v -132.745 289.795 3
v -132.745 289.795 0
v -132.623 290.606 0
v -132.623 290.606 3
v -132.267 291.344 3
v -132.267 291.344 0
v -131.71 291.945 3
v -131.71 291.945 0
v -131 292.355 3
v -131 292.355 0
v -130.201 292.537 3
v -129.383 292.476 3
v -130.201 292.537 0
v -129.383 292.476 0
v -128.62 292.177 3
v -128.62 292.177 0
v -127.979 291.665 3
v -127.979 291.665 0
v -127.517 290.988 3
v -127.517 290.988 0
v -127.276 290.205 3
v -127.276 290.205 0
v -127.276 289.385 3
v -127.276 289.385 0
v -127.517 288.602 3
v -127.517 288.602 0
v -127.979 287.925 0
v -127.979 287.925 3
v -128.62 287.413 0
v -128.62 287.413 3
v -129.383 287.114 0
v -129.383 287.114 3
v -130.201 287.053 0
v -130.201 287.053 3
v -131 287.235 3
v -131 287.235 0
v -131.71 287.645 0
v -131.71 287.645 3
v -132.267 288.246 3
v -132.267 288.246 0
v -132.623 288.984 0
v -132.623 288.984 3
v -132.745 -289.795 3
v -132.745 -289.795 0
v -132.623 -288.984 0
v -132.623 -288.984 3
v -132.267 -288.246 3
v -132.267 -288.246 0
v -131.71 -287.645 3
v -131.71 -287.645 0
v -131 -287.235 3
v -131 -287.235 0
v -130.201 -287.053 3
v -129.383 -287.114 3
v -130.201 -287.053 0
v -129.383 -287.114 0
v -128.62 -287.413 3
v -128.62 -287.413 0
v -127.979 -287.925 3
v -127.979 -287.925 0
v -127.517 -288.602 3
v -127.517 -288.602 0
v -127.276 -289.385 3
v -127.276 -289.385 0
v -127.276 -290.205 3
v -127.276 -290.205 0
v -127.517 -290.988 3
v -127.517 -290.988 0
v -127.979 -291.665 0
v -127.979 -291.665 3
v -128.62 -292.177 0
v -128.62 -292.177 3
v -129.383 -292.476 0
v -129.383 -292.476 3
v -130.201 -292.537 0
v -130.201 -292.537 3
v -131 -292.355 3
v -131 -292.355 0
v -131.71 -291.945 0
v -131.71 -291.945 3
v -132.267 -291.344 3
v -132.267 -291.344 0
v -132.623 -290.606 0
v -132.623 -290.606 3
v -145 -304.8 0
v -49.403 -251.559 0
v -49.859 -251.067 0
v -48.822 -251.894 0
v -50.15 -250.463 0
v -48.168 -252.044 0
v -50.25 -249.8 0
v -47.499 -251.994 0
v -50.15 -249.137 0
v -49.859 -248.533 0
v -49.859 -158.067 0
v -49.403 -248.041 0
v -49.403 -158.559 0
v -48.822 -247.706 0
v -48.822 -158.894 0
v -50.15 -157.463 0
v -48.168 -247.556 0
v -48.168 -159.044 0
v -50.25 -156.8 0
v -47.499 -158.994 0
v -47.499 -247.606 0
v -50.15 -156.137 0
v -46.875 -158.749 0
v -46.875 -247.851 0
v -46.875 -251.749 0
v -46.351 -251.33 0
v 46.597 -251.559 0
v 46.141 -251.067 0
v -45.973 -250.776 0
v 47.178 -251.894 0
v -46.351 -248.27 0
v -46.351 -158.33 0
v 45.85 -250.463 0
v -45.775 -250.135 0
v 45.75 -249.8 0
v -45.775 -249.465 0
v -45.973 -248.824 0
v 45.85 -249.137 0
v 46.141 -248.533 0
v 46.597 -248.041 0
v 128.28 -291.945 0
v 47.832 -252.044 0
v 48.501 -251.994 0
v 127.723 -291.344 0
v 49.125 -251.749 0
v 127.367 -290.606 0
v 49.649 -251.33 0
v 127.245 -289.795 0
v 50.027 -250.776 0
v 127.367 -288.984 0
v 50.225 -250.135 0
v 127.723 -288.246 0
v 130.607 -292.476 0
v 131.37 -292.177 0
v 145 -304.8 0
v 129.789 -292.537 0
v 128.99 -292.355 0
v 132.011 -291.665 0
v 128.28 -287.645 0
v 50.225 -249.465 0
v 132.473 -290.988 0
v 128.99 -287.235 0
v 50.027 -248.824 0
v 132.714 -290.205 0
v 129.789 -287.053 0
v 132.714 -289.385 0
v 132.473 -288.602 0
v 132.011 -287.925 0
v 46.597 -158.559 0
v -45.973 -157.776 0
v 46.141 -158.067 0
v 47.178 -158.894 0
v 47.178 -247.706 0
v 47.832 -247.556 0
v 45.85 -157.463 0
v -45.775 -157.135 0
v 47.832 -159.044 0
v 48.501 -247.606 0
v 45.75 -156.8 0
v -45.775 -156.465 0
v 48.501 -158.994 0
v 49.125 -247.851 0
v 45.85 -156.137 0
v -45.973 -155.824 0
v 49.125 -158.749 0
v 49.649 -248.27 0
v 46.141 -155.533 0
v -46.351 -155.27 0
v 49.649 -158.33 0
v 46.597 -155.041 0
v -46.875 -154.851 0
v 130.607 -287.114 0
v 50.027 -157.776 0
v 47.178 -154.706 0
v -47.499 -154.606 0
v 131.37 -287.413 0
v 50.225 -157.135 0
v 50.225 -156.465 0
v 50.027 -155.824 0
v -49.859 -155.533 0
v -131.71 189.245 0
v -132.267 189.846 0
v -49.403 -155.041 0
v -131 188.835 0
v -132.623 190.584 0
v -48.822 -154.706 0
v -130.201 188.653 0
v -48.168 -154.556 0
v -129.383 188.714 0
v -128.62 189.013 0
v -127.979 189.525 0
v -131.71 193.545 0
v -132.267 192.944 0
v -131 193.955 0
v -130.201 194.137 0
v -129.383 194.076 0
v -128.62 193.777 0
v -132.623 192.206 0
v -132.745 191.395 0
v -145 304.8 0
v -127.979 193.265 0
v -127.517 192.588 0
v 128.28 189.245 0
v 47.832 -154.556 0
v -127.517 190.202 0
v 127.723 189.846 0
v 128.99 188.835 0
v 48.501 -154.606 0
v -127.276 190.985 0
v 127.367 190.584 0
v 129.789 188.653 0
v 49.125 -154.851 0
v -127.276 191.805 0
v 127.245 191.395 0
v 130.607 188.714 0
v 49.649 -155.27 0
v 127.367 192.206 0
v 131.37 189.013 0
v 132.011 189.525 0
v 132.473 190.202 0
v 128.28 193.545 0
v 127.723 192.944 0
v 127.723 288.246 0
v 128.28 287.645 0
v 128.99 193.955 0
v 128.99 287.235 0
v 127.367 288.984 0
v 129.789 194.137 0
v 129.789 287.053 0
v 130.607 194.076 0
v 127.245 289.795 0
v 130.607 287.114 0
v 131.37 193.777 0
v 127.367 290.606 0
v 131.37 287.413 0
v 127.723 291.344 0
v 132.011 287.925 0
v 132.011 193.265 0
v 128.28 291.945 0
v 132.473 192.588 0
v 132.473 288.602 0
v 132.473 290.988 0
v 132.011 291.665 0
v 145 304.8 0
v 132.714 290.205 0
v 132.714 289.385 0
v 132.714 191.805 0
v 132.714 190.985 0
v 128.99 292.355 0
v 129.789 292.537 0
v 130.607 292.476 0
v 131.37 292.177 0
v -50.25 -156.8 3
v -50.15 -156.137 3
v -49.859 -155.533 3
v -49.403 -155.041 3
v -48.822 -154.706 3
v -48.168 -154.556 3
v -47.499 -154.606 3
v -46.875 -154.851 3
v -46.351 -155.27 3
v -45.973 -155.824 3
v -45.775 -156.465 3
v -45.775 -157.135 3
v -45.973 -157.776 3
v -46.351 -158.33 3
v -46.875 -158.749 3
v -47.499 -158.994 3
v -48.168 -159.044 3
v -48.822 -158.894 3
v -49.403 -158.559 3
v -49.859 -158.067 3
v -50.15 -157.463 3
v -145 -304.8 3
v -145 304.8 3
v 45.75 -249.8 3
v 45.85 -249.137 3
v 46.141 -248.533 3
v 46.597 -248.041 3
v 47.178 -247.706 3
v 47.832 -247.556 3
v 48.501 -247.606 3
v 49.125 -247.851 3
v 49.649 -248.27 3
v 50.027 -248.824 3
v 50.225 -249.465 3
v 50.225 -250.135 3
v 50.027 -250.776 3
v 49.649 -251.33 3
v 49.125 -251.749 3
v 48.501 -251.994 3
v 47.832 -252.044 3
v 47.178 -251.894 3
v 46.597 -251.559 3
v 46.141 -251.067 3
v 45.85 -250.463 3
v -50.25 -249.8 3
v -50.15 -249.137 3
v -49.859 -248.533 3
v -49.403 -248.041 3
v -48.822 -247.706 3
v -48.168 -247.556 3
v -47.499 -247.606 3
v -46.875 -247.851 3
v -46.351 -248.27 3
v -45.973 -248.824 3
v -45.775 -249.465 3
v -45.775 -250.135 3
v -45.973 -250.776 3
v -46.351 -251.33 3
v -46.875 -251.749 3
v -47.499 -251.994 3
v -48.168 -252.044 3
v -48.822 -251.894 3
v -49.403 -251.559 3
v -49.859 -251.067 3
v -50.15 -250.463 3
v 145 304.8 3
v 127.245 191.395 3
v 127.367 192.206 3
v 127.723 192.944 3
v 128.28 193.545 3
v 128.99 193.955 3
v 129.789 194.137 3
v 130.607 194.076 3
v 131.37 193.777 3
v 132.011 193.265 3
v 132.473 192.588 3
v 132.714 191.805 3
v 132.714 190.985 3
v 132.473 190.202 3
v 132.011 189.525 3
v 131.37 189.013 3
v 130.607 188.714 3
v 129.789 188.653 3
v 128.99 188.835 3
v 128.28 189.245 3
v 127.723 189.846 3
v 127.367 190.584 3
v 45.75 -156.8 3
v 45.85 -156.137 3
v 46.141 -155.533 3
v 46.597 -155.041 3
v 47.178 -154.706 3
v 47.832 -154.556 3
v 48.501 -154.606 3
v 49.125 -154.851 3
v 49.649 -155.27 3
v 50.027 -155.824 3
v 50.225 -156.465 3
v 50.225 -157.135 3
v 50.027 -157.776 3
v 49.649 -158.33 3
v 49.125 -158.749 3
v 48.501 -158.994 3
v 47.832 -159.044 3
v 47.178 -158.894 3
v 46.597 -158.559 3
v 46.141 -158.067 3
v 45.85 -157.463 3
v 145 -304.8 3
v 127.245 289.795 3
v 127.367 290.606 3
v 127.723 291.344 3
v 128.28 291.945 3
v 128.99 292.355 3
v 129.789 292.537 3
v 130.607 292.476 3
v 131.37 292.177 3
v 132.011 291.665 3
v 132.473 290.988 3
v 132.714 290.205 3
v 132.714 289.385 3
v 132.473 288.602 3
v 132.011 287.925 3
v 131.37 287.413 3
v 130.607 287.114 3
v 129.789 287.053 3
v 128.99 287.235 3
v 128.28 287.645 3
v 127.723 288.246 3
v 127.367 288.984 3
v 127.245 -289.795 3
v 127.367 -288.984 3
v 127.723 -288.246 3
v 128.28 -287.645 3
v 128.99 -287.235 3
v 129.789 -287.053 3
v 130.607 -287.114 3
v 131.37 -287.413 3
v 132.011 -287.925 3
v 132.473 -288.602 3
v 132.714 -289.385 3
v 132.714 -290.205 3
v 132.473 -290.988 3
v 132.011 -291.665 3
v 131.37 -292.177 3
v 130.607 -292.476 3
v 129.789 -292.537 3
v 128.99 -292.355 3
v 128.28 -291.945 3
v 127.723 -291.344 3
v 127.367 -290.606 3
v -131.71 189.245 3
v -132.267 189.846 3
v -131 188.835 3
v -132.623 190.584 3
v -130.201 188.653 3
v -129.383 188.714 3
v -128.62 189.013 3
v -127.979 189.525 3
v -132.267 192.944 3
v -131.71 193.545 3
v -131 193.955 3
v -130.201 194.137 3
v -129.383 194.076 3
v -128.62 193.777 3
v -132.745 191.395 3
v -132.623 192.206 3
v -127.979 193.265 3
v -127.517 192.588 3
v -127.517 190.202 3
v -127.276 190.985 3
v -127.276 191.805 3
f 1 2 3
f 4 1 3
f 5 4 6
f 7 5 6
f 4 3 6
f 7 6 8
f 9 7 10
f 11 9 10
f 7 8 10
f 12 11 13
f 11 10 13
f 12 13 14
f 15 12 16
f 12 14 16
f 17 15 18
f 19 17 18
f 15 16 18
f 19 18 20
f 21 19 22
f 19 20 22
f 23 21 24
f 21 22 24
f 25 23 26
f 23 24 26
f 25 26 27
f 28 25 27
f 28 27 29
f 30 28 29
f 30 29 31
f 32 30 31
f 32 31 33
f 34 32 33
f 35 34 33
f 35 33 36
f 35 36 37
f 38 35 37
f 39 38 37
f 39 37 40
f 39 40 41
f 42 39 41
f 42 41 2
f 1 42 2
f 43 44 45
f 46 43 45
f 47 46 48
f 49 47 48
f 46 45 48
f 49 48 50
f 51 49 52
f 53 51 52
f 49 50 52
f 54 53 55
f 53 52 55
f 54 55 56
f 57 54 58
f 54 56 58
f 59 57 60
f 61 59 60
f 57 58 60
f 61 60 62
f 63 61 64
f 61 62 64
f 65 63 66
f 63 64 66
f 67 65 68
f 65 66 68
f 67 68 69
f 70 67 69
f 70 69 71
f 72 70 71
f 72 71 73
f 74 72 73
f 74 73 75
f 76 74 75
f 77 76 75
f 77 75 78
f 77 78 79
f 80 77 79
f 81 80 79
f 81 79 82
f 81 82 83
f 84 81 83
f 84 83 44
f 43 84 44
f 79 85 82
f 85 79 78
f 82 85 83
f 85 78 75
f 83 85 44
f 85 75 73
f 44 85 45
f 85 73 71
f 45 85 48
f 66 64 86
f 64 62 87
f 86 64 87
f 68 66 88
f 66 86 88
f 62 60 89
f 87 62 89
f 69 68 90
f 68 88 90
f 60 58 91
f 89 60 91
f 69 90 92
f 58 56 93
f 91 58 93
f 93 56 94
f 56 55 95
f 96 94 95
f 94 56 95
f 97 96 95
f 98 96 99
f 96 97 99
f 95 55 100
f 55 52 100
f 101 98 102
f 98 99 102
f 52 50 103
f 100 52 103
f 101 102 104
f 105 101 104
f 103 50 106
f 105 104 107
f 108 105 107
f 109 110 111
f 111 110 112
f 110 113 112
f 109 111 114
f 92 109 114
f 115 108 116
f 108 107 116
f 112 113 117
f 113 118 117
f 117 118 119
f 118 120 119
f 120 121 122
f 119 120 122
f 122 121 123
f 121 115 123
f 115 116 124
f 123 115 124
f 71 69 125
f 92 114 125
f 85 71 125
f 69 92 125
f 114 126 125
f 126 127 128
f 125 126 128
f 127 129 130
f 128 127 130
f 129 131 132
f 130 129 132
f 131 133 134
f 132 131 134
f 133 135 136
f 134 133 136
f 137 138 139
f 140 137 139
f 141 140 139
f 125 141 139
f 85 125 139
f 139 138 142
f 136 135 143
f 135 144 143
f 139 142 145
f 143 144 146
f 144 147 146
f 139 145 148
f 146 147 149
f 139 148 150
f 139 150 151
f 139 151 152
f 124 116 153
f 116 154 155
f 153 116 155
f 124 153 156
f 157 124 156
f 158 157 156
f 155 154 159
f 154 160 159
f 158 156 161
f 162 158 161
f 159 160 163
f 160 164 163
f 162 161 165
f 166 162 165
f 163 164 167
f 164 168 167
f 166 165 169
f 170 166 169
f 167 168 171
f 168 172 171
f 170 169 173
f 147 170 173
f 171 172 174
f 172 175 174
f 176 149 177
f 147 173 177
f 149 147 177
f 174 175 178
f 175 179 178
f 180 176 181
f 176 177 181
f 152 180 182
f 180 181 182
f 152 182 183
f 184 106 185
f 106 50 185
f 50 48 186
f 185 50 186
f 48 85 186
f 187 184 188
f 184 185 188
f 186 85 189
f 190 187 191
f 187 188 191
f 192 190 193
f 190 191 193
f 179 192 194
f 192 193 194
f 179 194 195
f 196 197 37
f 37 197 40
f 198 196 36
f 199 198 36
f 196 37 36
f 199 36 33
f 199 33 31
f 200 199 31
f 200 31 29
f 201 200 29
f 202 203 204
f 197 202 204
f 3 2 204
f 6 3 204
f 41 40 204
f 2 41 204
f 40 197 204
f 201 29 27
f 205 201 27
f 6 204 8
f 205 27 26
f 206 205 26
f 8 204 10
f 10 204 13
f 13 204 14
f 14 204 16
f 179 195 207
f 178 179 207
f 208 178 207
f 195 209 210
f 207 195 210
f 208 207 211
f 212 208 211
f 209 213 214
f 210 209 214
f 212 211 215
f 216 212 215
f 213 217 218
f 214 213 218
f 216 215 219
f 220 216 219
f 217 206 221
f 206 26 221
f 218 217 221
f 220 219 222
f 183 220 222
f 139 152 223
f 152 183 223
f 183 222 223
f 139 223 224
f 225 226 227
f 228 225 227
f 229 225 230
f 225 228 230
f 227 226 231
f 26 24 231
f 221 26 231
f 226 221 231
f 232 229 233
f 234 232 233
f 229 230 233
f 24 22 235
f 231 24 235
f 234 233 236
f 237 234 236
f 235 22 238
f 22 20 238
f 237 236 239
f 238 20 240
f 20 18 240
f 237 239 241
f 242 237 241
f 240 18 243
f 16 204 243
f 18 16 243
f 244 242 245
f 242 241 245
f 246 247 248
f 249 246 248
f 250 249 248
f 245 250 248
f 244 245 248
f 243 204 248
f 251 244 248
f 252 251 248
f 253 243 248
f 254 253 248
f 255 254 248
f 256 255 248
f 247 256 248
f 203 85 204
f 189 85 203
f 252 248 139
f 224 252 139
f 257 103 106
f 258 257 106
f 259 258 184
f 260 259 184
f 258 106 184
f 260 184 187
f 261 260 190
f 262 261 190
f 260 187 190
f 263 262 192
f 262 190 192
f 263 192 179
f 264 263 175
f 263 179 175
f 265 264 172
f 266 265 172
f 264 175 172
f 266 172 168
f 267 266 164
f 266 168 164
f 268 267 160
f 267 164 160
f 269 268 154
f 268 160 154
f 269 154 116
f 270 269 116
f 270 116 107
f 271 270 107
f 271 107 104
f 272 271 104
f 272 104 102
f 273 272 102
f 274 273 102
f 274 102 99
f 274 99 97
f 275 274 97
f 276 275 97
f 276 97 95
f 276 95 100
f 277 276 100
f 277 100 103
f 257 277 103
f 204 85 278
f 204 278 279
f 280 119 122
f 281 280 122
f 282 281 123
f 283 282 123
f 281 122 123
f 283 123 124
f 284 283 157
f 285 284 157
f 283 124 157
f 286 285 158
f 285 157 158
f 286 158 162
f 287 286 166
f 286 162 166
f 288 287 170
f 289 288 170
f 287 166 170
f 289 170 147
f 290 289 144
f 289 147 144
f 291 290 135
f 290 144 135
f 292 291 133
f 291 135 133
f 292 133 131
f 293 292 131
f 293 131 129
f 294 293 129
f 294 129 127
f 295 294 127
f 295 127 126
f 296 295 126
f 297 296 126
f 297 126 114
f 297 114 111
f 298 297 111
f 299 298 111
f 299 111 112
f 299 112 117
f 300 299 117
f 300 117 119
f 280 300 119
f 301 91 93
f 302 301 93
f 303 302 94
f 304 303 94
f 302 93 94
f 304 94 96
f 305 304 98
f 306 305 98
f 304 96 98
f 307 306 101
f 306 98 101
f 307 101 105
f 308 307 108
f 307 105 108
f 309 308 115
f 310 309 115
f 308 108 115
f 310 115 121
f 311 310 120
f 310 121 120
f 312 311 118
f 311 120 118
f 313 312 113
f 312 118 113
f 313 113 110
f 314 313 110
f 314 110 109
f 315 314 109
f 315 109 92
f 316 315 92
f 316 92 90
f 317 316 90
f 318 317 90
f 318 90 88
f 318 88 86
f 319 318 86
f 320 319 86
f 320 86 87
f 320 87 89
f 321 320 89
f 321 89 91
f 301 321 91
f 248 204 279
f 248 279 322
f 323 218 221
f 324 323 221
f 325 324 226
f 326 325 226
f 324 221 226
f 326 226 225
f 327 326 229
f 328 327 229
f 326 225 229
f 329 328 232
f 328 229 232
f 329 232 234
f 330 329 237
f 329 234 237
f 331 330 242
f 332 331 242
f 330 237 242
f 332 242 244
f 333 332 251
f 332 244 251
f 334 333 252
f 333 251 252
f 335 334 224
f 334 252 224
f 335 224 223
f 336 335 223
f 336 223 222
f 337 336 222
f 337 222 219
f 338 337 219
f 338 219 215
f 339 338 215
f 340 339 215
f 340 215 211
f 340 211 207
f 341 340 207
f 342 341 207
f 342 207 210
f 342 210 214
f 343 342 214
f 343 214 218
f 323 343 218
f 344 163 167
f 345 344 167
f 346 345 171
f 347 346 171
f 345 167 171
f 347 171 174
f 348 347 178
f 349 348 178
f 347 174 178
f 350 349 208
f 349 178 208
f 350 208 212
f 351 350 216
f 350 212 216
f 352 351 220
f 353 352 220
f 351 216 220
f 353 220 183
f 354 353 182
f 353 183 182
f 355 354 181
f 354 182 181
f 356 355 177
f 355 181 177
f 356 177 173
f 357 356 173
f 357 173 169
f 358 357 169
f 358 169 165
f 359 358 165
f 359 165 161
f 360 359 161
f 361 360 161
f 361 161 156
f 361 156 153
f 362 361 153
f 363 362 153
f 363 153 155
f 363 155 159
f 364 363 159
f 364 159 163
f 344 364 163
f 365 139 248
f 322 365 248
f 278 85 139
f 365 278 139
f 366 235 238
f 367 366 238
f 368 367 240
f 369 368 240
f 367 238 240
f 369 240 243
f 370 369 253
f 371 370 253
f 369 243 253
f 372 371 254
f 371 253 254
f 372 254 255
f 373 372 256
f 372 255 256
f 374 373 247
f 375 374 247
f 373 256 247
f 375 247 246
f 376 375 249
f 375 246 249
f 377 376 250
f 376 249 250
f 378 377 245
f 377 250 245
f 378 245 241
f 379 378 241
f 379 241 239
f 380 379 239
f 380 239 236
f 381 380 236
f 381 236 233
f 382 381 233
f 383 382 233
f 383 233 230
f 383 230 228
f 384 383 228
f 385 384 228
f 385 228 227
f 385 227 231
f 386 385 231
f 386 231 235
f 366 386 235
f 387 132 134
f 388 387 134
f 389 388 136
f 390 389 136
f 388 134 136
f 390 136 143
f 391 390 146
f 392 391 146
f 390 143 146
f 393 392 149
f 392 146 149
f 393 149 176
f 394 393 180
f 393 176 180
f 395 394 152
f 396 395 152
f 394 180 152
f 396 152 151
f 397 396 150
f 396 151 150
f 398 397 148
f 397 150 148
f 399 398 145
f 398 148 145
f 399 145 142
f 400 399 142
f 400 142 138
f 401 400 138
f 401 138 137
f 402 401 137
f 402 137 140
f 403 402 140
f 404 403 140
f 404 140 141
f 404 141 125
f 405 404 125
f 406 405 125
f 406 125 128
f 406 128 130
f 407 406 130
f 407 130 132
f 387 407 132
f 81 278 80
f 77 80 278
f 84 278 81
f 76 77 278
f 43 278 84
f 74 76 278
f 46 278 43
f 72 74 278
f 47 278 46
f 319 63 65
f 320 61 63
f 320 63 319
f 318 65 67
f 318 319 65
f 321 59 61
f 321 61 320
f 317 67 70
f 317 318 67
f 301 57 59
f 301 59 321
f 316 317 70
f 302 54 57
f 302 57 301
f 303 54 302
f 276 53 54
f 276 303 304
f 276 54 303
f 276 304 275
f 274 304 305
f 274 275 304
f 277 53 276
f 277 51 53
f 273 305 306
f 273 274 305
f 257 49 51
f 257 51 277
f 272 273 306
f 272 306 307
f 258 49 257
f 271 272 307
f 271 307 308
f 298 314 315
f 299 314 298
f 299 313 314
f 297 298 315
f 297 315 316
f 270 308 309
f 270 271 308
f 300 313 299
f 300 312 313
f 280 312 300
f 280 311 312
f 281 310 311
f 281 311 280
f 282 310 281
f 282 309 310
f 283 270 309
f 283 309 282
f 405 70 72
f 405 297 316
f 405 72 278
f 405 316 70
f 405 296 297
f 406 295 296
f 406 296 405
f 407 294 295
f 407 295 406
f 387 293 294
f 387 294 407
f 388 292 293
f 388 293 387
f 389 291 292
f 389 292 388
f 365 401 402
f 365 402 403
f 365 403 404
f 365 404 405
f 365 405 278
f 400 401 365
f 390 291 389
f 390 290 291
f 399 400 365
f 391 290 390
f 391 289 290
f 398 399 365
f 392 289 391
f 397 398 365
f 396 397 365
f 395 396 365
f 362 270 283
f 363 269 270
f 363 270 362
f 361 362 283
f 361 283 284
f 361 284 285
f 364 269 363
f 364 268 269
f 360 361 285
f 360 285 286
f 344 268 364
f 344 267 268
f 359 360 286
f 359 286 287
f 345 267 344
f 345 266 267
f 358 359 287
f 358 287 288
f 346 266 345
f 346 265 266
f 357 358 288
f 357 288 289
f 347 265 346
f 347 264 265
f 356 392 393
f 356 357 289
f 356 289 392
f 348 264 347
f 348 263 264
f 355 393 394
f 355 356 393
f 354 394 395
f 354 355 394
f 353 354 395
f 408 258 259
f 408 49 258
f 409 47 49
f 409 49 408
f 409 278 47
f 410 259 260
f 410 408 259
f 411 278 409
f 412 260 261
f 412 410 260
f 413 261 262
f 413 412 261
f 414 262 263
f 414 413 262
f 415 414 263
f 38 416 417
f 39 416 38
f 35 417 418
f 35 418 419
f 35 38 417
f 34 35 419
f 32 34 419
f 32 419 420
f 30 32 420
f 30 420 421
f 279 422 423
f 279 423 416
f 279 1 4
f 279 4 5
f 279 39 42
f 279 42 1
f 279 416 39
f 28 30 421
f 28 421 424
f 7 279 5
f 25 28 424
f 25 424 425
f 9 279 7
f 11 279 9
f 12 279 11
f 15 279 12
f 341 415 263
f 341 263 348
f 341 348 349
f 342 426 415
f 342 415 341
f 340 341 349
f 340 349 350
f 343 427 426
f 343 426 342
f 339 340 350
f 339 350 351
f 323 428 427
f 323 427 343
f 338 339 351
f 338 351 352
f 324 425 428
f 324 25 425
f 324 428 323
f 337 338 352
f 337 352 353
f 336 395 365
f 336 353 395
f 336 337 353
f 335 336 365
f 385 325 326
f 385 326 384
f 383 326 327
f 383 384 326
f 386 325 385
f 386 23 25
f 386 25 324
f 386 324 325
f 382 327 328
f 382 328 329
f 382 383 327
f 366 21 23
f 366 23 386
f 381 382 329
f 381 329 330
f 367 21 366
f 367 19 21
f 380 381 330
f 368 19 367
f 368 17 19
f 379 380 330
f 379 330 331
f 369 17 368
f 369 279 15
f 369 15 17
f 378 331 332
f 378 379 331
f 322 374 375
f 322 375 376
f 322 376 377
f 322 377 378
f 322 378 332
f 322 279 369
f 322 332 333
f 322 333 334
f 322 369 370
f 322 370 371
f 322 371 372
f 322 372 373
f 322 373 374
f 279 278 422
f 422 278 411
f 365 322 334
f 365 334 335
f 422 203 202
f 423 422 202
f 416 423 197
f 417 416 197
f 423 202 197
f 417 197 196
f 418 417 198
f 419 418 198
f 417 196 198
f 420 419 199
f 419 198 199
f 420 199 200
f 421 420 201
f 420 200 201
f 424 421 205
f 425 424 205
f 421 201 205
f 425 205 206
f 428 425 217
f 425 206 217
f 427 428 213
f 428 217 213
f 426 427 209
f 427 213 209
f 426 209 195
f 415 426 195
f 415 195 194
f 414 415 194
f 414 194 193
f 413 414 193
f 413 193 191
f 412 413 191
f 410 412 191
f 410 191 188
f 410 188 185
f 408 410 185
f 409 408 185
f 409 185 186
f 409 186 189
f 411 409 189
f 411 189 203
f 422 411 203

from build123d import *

# Parameters (mm, degrees)
SKETCH1_W            = 290
SKETCH1_H            = 609.6
BOSS_EXTRUDE1_DEPTH  = 3
M5_CLEARANCE_HOLE1_D = 5.5
M4_CLEARANCE_HOLE1_D = 4.5


with BuildPart() as part:
    # Sketch1 → Boss-Extrude1 (new body)
    with BuildSketch(Plane.XY):
        Rectangle(SKETCH1_W, SKETCH1_H)
    extrude(amount=BOSS_EXTRUDE1_DEPTH)

    # M5 Clearance Hole1 (through all)
    with Locations(Plane.XY.offset(3)):
        with Locations((129.995, 289.795), (-129.995, 289.795), (-129.995, -289.795), (129.995, -289.795), (129.995, 191.395), (-129.995, 191.395)):
            Hole(M5_CLEARANCE_HOLE1_D / 2)

    # M4 Clearance Hole1 (through all)
    with Locations(Plane.XY.offset(3)):
        with Locations((-48, -156.8), (-48, -249.8), (48, -249.8), (48, -156.8)):
            Hole(M4_CLEARANCE_HOLE1_D / 2)


solid = part.part
